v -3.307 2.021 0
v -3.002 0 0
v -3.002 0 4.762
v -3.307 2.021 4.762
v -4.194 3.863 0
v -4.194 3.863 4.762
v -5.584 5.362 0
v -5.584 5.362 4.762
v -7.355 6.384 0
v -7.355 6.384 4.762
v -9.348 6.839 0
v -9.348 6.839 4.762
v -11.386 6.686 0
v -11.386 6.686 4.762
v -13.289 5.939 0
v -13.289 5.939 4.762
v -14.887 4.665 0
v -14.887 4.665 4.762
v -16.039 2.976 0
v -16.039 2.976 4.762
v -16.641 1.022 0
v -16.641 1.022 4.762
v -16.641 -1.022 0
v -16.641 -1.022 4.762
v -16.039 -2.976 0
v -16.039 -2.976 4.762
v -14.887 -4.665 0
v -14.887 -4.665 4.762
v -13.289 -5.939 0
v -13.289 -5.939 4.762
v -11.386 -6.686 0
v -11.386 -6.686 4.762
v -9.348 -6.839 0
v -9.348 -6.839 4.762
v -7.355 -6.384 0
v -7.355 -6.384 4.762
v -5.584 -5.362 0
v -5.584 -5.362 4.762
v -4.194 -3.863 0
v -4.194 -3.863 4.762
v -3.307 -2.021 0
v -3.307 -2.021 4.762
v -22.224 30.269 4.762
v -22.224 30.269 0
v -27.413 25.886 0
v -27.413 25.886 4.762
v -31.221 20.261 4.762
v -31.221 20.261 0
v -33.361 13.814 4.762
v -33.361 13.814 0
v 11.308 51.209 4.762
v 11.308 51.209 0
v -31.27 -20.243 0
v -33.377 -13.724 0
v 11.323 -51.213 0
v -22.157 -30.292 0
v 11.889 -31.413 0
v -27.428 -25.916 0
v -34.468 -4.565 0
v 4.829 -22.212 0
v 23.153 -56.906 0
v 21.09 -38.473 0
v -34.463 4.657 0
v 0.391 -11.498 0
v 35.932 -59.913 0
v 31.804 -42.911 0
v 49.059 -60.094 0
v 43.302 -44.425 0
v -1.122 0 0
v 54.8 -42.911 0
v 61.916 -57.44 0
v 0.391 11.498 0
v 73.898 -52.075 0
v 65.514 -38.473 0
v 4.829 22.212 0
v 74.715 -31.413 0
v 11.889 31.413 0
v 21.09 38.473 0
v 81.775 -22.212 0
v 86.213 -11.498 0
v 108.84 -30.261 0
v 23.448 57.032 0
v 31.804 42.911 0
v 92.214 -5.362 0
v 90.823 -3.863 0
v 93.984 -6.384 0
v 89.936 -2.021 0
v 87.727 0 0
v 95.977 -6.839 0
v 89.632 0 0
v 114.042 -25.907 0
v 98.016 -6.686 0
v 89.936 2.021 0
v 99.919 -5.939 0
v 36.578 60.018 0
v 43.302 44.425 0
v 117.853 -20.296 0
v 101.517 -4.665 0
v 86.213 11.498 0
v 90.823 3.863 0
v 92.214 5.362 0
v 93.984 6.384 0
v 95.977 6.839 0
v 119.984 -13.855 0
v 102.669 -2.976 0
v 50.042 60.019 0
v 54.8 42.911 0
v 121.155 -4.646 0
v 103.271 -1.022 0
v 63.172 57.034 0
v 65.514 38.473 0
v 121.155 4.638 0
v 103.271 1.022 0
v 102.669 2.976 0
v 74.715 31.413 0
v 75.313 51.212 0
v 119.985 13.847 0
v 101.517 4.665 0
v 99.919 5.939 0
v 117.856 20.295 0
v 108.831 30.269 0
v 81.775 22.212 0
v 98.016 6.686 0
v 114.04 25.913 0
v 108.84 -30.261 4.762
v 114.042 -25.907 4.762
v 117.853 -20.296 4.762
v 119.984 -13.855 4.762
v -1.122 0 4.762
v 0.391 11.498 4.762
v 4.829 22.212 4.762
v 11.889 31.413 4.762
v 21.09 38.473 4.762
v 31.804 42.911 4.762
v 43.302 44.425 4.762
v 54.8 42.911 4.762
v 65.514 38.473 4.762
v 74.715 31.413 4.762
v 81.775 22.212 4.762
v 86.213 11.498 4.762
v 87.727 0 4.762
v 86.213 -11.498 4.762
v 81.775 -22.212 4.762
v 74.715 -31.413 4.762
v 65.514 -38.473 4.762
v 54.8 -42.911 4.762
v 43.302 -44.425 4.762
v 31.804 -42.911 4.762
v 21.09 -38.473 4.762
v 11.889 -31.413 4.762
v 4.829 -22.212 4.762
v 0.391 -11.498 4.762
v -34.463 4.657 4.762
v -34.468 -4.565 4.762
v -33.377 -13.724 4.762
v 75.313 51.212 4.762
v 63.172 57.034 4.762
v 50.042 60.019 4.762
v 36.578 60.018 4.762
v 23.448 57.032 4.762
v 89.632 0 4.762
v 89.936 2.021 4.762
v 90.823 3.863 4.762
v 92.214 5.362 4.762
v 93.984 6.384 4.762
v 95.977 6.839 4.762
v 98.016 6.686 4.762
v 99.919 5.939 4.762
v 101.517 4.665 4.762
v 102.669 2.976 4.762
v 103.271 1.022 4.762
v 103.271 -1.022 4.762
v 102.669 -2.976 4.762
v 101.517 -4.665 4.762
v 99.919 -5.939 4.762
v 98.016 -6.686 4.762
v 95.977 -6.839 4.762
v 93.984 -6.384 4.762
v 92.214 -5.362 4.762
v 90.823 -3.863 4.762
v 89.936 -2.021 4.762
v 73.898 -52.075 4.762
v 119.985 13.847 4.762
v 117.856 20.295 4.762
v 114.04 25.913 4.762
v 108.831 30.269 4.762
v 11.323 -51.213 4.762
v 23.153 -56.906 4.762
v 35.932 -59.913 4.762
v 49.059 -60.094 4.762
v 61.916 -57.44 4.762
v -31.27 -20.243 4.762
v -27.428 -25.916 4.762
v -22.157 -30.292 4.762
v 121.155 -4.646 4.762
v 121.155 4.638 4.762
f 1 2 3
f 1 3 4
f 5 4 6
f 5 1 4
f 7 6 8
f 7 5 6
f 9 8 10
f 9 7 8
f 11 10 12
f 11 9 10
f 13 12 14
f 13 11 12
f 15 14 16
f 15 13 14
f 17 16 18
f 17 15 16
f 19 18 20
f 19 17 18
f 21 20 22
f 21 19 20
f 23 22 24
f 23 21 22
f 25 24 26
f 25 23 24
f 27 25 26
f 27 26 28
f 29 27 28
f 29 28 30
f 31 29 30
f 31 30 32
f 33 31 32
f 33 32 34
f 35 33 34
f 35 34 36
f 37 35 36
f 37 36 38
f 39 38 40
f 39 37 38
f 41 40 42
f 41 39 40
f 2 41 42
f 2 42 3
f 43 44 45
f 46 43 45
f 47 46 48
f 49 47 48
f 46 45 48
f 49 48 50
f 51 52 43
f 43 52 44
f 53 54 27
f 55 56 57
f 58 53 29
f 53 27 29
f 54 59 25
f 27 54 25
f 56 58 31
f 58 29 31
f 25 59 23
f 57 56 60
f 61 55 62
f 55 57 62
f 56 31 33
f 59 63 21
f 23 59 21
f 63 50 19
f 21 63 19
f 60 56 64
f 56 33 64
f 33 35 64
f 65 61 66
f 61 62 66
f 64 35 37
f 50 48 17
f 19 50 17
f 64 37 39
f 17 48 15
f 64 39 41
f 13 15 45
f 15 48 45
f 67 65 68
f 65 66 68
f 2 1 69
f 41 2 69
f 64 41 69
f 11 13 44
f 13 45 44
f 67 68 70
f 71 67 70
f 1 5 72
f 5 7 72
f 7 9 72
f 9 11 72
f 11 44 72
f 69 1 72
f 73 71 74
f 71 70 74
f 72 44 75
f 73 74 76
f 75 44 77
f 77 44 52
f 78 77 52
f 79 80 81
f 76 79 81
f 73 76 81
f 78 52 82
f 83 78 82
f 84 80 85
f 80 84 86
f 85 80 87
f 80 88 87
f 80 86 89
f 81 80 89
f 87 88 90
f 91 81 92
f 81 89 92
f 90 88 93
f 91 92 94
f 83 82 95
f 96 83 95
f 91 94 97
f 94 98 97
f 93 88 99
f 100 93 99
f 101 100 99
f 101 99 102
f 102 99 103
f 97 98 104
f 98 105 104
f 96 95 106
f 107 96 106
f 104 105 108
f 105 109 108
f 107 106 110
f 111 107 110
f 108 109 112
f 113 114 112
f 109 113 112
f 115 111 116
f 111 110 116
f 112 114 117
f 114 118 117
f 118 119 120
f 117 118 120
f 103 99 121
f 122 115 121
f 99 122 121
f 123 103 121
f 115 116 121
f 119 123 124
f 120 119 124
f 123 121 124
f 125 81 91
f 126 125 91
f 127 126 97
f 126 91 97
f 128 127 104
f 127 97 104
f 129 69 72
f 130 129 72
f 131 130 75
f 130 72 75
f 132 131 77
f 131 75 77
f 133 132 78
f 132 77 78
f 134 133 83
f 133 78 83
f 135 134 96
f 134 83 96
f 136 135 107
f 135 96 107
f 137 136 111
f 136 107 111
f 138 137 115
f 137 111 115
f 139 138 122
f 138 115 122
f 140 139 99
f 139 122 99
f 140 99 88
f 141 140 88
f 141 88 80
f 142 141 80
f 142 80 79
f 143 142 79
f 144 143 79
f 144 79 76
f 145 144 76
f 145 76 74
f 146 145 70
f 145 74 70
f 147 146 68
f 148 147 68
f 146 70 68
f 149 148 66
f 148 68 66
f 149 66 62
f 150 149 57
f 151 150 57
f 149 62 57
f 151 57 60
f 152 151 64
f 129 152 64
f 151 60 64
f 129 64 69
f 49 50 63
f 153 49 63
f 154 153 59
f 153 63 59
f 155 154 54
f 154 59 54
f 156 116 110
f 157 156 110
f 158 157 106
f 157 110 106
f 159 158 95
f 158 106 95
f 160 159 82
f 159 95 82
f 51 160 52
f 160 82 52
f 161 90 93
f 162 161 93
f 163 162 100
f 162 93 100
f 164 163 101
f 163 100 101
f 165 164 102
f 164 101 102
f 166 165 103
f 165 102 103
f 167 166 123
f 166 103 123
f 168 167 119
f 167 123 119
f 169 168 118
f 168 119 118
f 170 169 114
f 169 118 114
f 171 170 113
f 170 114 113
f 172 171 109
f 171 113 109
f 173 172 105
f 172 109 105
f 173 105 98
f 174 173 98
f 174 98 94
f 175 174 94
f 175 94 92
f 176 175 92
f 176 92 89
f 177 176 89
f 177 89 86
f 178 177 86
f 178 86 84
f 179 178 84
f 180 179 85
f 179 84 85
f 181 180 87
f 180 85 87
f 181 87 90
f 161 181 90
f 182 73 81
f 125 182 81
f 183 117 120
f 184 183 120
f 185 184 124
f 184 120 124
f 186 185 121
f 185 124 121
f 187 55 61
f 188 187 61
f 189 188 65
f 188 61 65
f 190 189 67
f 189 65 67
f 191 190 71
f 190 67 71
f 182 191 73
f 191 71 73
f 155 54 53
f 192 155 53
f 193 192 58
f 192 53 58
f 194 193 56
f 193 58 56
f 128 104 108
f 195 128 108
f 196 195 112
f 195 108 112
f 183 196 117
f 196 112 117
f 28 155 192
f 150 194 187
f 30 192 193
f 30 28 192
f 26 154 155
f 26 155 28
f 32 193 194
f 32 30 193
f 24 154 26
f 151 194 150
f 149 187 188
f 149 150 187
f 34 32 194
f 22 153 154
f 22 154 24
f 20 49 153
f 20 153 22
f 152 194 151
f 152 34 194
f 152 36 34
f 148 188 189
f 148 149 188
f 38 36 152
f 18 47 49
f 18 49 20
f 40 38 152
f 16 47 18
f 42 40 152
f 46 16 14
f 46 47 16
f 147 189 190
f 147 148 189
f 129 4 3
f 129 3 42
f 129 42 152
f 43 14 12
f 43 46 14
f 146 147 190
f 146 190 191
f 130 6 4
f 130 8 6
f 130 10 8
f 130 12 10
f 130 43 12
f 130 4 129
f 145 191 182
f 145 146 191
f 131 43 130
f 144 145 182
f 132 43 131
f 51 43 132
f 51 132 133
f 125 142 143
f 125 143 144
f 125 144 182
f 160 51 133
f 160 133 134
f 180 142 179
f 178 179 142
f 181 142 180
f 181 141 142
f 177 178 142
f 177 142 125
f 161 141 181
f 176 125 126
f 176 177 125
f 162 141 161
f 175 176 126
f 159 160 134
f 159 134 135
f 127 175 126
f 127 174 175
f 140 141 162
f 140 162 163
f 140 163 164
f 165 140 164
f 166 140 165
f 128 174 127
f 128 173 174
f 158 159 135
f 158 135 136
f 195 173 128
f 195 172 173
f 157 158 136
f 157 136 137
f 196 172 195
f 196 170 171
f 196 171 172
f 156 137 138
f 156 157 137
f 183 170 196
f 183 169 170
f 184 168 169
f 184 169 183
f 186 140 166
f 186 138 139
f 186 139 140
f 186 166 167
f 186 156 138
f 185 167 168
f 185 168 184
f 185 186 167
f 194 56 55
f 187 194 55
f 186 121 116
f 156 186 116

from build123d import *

# Parameters (mm, degrees)
F0_R     = 6.858
F1_DEPTH = 4.7625


with BuildPart() as f1:
    # F0 (on Top) → F1 (new body)
    with BuildSketch(Plane.XY):
        with BuildLine():
            ThreePointArc((-33.360649, 13.814234), (-34.603048, 0.046057), (-33.376957, -13.723581))
            ThreePointArc((-33.376957, -13.723581), (-29.549678, -23.21519), (-22.156792, -30.292191))
            Line((-22.156792, -30.292191), (11.323438, -51.212653))
            ThreePointArc((11.323438, -51.212653), (42.490556, -60.360838), (73.897804, -52.074505))
            Line((73.897804, -52.074505), (108.839764, -30.261436))
            ThreePointArc((108.839764, -30.261436), (116.142274, -23.23358), (119.984489, -13.855157))
            ThreePointArc((119.984489, -13.855157), (121.301479, -0.00415), (119.985359, 13.84694))
            ThreePointArc((119.985359, 13.84694), (116.14346, 23.236597), (108.83063, 30.26855))
            Line((108.83063, 30.26855), (75.312555, 51.212004))
            ThreePointArc((75.312555, 51.212004), (43.309839, 60.395046), (11.308, 51.208947))
            Line((11.308, 51.208947), (-22.223896, 30.269336))
            ThreePointArc((-22.223896, 30.269336), (-29.510199, 23.204472), (-33.360649, 13.814234))
        make_face()
        with Locations((-9.860053, 0)):
            Circle(F0_R, mode=Mode.SUBTRACT)
        with BuildLine():
            ThreePointArc((87.726747, 0), (43.302147, -44.4246), (-1.122453, 0))
            ThreePointArc((-1.122453, 0), (43.302147, 44.4246), (87.726747, 0))
        make_face(mode=Mode.SUBTRACT)
        with BuildLine():
            ThreePointArc((103.347747, 0), (96.489747, -6.858), (89.631747, 0))
            ThreePointArc((89.631747, 0), (96.489747, 6.858), (103.347747, 0))
        make_face(mode=Mode.SUBTRACT)
    extrude(amount=F1_DEPTH)


solid = f1.part
